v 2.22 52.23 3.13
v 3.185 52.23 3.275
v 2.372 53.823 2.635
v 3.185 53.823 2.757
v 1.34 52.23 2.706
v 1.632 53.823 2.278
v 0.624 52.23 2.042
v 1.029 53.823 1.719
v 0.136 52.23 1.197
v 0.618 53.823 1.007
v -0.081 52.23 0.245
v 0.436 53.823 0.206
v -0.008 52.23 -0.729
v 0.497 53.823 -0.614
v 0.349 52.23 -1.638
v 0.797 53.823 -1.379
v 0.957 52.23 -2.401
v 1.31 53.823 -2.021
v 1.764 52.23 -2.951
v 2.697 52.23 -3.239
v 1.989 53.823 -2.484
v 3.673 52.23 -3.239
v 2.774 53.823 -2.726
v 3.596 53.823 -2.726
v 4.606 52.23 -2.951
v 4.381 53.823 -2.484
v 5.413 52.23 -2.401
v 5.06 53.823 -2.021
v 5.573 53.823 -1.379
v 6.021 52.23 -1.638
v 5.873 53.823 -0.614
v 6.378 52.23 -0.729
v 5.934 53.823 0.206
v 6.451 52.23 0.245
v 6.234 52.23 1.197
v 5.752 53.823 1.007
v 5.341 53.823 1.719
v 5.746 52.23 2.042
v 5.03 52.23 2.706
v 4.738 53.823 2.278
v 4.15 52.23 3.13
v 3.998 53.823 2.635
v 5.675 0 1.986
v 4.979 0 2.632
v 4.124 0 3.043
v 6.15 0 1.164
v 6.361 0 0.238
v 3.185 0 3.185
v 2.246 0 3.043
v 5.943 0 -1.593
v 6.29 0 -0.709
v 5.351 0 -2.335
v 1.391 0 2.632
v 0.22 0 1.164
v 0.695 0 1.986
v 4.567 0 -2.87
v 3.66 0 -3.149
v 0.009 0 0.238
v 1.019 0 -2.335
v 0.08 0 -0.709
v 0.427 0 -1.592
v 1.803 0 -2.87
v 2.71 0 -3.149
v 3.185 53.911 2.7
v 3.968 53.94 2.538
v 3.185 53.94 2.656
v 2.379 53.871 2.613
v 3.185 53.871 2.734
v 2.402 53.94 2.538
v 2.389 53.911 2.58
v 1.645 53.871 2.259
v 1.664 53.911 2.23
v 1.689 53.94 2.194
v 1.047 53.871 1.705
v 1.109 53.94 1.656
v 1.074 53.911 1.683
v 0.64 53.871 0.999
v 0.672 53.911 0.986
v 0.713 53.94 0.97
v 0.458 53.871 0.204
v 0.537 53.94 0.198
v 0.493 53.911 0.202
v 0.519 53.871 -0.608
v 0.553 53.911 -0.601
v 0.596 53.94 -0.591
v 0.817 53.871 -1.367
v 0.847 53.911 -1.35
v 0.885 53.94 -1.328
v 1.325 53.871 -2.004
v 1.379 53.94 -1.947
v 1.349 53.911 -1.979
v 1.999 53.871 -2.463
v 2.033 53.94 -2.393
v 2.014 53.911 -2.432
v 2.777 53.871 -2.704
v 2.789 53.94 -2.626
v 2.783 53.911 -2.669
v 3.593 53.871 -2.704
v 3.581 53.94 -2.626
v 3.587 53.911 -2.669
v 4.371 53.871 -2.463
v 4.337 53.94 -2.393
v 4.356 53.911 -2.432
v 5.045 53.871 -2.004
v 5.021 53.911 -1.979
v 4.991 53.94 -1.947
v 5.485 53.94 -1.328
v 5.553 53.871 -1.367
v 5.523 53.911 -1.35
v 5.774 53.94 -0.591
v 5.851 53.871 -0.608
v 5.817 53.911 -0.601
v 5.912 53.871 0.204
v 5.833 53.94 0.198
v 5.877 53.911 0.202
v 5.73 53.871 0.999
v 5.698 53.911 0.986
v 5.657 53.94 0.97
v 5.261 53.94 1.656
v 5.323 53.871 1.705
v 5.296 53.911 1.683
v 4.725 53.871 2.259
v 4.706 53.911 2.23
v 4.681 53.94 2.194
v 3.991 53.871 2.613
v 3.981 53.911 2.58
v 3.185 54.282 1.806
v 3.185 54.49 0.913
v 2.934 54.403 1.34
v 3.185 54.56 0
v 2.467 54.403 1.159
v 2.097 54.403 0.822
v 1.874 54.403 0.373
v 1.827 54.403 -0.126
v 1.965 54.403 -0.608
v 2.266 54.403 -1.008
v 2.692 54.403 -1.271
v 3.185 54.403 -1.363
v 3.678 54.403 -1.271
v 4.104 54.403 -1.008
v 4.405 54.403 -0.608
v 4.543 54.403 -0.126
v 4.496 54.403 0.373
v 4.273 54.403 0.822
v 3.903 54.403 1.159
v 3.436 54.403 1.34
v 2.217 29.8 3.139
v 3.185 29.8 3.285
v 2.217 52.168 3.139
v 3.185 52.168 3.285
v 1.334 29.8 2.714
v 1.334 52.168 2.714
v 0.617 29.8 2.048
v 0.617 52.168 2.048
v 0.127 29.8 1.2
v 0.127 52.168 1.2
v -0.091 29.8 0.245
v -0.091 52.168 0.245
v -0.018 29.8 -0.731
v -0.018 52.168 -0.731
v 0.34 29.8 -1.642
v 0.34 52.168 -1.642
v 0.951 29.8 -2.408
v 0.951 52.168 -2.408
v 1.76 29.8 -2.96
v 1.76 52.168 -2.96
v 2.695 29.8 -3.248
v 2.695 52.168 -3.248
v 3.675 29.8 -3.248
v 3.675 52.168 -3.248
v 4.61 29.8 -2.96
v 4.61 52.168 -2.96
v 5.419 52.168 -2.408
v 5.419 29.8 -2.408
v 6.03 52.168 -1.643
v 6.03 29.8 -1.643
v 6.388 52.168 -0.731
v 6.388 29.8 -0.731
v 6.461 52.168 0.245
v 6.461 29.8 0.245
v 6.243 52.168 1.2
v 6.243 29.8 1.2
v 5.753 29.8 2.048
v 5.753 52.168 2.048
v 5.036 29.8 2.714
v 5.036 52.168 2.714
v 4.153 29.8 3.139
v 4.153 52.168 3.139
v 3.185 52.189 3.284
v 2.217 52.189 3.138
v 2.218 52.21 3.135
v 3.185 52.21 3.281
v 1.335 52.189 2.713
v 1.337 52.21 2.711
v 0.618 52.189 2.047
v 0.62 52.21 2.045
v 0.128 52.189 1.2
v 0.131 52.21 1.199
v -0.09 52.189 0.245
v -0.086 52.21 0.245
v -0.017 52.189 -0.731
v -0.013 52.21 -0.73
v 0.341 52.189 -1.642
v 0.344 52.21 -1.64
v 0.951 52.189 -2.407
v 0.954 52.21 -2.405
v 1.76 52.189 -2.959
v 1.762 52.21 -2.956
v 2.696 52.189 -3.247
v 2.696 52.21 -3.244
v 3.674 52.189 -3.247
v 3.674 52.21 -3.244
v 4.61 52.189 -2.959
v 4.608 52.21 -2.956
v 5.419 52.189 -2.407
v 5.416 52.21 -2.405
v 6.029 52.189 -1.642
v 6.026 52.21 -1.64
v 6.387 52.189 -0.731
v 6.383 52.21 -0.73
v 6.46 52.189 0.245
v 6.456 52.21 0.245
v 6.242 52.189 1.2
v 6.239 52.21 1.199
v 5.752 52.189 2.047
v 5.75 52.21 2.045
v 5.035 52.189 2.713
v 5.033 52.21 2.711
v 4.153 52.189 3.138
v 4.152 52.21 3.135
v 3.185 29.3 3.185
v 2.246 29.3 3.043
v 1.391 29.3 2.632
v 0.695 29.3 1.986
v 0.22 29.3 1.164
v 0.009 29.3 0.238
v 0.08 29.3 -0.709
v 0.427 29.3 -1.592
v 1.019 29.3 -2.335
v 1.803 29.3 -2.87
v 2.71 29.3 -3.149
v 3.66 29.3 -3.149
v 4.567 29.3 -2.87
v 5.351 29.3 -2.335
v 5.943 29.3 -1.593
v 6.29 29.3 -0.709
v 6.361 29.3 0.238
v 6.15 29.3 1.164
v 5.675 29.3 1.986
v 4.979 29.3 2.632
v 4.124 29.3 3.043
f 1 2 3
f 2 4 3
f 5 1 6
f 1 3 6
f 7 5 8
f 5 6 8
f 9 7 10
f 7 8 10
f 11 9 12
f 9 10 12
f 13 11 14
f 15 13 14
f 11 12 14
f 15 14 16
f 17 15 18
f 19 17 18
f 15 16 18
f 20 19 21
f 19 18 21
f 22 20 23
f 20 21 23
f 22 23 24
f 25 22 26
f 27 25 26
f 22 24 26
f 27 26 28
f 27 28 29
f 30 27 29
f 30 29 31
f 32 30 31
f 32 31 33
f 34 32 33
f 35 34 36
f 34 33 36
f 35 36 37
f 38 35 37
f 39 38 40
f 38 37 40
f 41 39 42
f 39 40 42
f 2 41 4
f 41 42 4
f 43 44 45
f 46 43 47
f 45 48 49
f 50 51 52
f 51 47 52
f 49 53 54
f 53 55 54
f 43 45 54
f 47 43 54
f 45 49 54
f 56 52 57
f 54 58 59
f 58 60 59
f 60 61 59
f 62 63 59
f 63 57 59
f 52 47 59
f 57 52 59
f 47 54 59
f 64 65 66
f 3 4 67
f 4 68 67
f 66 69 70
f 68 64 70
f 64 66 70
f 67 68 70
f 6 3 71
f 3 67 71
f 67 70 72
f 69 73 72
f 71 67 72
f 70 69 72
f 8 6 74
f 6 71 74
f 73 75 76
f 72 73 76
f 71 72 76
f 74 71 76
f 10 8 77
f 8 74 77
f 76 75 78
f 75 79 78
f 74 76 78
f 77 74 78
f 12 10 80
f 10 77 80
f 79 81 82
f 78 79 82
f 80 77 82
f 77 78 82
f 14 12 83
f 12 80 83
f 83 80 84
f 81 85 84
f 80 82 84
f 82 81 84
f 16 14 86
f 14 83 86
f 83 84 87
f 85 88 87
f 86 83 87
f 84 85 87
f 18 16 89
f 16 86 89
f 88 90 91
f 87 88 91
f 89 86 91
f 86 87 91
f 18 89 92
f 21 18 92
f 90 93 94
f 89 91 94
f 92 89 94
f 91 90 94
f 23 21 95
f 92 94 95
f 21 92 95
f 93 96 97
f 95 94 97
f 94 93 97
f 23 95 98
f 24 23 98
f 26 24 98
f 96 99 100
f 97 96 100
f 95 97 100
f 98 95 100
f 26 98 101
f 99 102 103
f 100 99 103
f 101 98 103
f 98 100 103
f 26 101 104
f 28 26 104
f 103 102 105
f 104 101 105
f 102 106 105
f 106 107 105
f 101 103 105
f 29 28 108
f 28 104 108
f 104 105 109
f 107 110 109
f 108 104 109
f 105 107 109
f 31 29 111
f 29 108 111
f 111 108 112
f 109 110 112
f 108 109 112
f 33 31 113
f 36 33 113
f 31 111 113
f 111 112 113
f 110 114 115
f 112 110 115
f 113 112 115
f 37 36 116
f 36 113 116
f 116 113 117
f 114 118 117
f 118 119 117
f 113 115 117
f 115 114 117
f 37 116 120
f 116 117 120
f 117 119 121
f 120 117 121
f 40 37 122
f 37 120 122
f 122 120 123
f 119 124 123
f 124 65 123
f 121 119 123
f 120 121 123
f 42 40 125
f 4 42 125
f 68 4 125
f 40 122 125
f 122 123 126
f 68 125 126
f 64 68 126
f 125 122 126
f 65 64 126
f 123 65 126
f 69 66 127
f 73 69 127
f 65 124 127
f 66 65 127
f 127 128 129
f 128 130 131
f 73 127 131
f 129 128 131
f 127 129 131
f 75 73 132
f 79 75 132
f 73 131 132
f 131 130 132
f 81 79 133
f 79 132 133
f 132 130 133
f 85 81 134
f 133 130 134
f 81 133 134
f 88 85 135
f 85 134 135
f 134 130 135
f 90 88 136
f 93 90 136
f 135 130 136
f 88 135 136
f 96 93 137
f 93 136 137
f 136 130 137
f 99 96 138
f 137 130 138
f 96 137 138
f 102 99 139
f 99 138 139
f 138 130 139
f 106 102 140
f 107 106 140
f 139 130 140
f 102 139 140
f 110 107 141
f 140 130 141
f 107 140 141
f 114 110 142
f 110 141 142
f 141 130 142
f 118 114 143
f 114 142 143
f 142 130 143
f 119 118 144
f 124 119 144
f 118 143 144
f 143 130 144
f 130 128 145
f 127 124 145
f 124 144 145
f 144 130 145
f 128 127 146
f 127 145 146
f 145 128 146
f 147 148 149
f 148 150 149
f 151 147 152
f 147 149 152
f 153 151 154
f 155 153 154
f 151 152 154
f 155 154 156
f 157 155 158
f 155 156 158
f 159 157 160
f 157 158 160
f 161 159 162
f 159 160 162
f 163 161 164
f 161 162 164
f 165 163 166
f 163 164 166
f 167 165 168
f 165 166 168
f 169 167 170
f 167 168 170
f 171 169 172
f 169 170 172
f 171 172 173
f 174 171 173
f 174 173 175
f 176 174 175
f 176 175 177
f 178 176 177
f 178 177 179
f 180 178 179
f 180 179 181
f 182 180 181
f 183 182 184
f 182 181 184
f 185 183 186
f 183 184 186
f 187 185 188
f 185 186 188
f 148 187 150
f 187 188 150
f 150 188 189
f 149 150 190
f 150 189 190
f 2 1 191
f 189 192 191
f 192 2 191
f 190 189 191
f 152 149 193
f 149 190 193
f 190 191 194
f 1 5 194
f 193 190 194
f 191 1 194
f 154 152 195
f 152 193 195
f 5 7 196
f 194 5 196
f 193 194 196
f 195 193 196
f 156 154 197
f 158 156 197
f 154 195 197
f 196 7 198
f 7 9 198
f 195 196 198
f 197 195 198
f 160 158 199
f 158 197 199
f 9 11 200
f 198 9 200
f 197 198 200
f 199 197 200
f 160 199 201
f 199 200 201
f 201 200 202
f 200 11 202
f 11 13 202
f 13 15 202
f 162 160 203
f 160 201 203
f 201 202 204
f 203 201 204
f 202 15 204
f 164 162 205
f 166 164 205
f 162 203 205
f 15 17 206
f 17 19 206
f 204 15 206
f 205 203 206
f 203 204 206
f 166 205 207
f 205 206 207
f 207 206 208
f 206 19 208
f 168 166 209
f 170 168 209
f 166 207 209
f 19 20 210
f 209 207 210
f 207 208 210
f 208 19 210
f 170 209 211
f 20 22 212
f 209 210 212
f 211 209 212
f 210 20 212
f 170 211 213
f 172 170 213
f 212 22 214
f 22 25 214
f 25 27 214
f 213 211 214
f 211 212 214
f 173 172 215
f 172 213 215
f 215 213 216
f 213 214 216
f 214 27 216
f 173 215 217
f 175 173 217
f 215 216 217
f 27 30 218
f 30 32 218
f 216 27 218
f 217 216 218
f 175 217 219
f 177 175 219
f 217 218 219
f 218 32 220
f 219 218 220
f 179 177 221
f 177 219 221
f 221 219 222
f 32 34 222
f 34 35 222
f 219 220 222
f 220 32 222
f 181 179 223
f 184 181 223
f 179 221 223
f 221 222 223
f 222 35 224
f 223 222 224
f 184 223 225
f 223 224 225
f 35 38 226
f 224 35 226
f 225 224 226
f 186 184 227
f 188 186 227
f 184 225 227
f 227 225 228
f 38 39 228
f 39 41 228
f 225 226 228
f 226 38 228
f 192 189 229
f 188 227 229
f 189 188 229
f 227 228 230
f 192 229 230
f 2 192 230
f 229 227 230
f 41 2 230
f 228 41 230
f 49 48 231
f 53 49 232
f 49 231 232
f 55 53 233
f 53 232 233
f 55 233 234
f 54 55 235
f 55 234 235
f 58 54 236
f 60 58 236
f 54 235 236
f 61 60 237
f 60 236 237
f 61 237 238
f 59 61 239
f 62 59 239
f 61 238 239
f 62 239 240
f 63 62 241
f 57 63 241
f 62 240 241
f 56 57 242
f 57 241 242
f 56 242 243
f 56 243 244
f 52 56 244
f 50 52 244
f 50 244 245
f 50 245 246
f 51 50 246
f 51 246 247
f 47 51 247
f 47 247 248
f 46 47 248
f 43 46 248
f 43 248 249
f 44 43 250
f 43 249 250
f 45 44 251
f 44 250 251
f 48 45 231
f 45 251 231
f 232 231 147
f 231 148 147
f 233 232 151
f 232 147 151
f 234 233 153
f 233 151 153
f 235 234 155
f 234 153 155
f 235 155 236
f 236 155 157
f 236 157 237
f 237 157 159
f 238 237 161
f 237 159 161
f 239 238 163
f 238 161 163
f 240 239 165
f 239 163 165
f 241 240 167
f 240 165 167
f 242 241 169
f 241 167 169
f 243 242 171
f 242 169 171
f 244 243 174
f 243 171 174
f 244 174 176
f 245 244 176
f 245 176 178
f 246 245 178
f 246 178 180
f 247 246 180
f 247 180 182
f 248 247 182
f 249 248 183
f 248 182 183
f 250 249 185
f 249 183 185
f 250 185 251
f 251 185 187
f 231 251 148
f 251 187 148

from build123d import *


with BuildPart() as part:
    # Esboço2 → Revolução1 (revolve)
    with BuildSketch(Plane.XY, mode=Mode.PRIVATE) as revolu_o1_sk:
        with BuildLine():
            Line((0, 0), (0, 29.3))
            Line((0, 29.3), (-0.1, 29.8))
            Line((-0.1, 29.8), (-0.1, 52.16829481))
            ThreePointArc((-0.1, 52.16829481), (-0.097533347, 52.199608972), (-0.090194233, 52.230150722))
            Line((-0.090194233, 52.230150722), (0.427794957, 53.822861152))
            ThreePointArc((0.427794957, 53.822861152), (0.466757595, 53.891883063), (0.529471576, 53.940350248))
            ThreePointArc((0.529471576, 53.940350248), (1.821567106, 54.403034378), (3.185, 54.56))
            Line((3.185, 54.56), (3.185, 0))
            Line((3.185, 0), (0, 0))
        make_face()
    revolve(revolu_o1_sk.sketch.rotate(Axis((3.185, 54.56, 0), (0, -1, 0)), 270), axis=Axis((3.185, 54.56, 0), (0, -1, 0)))


solid = part.part
